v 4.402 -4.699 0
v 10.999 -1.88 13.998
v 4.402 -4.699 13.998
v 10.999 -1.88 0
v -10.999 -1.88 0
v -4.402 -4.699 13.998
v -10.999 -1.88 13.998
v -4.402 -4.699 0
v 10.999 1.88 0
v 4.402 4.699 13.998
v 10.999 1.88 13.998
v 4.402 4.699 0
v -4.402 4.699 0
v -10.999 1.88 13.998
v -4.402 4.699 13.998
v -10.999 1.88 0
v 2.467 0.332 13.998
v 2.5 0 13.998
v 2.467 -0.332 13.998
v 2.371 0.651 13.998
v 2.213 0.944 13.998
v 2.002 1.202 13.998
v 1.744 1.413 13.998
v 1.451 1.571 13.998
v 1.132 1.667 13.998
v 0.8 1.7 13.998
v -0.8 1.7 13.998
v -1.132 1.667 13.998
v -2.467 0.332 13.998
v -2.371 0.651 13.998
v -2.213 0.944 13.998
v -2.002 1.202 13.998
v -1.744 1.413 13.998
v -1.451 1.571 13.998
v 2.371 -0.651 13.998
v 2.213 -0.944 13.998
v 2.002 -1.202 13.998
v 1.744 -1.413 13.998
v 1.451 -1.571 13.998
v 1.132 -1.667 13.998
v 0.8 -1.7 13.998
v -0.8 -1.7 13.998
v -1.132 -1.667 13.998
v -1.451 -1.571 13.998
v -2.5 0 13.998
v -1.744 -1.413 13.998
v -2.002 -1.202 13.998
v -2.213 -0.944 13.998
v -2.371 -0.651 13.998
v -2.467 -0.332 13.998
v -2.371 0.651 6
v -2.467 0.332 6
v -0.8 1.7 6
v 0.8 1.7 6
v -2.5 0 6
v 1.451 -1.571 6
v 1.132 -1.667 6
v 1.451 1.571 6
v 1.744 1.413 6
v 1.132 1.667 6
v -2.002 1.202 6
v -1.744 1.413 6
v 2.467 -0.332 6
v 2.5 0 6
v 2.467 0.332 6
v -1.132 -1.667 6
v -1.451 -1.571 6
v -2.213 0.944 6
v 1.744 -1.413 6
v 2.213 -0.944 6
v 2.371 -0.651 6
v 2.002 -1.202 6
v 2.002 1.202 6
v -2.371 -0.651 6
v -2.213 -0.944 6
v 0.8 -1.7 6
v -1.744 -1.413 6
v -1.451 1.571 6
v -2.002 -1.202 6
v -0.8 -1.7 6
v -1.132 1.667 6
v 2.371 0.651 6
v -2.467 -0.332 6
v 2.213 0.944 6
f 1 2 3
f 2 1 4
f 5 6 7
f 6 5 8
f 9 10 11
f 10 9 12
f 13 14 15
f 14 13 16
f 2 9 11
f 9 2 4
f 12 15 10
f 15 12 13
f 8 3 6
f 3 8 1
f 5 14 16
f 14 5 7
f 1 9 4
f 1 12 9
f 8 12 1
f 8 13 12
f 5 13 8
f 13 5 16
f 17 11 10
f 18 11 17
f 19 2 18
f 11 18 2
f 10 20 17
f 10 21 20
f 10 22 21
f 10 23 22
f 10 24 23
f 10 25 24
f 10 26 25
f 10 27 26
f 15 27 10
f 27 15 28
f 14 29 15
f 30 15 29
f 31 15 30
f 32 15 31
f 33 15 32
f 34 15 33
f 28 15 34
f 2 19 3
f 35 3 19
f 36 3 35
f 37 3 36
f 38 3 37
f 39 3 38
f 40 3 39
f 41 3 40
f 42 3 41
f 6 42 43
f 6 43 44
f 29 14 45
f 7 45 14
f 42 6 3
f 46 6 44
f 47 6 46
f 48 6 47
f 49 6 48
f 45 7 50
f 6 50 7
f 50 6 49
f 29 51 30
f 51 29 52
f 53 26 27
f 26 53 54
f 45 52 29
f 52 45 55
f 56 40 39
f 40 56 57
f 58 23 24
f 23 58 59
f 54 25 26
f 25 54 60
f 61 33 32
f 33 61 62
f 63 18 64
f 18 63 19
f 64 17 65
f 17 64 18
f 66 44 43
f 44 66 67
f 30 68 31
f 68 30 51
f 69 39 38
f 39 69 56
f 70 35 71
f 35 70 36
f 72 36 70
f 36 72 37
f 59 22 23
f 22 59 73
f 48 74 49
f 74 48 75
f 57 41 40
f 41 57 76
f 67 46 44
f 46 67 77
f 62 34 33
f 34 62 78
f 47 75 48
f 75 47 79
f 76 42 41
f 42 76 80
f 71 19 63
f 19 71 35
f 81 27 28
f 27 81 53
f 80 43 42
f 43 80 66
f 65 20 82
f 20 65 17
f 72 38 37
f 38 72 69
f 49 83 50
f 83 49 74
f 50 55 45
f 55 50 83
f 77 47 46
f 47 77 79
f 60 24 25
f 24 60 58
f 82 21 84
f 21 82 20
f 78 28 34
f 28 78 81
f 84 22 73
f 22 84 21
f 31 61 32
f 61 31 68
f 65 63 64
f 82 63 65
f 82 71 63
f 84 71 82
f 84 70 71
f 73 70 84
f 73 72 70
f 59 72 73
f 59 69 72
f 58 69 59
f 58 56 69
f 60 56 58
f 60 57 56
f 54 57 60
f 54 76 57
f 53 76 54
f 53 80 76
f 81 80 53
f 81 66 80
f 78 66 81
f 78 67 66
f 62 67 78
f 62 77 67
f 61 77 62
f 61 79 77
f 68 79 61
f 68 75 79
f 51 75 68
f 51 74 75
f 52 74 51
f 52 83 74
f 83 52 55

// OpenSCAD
//
// Tuning peg knob
// version 1.0   7/26/2015
// by daozenciaoyen
//

/* [Hole (Peg)] */
// length of the hole (in mm)
hole_x = 5 ; // [3:0.1:8]
// the shorter dimension (in mm)
hole_y = 3.4 ; // [2:0.1:6]
// in mm
hole_depth = 8 ; // [5:12]

/* [Knob] */
// in mm
knob_width = 22 ; // [14:30]
// same direction as hole depth (in mm)
knob_height = 14 ; // [10:30]
// the minimum thickness (in mm)
min_thickness = 3 ; // [1:0.2:5]
// chamfer % (width)
chamfer_width_pct = 0.3 ; // [0:0.1:0.4]
// chamfer % (thickness)
chamfer_thick_pct = 0.3 ; // [0:0.1:0.4]

/* [Hidden] */
knob_thickness = hole_y + min_thickness*2 ;
knob_width_slope = knob_width * chamfer_width_pct ;
knob_thick_slope = knob_thickness * chamfer_thick_pct ;
knob_slope_angle = atan(knob_thick_slope/knob_width_slope) ;
knob_slope_hyp = sqrt(pow(knob_width_slope,2)+pow(knob_thick_slope,2)) ;
hole_flat = hole_x/2 - hole_y/2 ;
knob_height1 = knob_height < hole_depth + min_thickness ? 
  hole_depth + min_thickness :
  knob_height ;
ff = 0.001 ;
$fn = 32 ;

main() ;

module main()
{
    translate([0,0,knob_height1])
    rotate([-90,0,0])
    difference() 
    {
        knob() ;
        hole() ;
        slope() ;
        mirror([1,0,0]) slope() ;
        mirror([0,0,1]) slope() ;
        mirror([1,0,0]) mirror([0,0,1]) slope() ;
    }
} 

module knob() 
{
    translate([0,knob_height1/2+ff,0])
    cube([knob_width-ff*2,knob_height1-ff*2,knob_thickness-ff*2], center=true) ;
}

module hole()
{
    rotate([-90,0,0])
    linear_extrude(height=hole_depth)
    hull() 
    {
        translate([-hole_flat,0,0]) circle(hole_y/2) ;
        translate([hole_flat,0,0]) circle(hole_y/2) ;
    }
}

module slope()
{
    translate([knob_width/2-knob_width_slope,ff,-knob_thickness/2])
    rotate([0,-knob_slope_angle,0])
    difference() 
    {
        rotate([0,knob_slope_angle,0])
            cube([knob_width_slope,knob_height1,knob_thick_slope]) ;
        translate([0,-ff,0])
            cube([knob_slope_hyp,knob_height1+ff*2,knob_thick_slope]) ;
    }
}
